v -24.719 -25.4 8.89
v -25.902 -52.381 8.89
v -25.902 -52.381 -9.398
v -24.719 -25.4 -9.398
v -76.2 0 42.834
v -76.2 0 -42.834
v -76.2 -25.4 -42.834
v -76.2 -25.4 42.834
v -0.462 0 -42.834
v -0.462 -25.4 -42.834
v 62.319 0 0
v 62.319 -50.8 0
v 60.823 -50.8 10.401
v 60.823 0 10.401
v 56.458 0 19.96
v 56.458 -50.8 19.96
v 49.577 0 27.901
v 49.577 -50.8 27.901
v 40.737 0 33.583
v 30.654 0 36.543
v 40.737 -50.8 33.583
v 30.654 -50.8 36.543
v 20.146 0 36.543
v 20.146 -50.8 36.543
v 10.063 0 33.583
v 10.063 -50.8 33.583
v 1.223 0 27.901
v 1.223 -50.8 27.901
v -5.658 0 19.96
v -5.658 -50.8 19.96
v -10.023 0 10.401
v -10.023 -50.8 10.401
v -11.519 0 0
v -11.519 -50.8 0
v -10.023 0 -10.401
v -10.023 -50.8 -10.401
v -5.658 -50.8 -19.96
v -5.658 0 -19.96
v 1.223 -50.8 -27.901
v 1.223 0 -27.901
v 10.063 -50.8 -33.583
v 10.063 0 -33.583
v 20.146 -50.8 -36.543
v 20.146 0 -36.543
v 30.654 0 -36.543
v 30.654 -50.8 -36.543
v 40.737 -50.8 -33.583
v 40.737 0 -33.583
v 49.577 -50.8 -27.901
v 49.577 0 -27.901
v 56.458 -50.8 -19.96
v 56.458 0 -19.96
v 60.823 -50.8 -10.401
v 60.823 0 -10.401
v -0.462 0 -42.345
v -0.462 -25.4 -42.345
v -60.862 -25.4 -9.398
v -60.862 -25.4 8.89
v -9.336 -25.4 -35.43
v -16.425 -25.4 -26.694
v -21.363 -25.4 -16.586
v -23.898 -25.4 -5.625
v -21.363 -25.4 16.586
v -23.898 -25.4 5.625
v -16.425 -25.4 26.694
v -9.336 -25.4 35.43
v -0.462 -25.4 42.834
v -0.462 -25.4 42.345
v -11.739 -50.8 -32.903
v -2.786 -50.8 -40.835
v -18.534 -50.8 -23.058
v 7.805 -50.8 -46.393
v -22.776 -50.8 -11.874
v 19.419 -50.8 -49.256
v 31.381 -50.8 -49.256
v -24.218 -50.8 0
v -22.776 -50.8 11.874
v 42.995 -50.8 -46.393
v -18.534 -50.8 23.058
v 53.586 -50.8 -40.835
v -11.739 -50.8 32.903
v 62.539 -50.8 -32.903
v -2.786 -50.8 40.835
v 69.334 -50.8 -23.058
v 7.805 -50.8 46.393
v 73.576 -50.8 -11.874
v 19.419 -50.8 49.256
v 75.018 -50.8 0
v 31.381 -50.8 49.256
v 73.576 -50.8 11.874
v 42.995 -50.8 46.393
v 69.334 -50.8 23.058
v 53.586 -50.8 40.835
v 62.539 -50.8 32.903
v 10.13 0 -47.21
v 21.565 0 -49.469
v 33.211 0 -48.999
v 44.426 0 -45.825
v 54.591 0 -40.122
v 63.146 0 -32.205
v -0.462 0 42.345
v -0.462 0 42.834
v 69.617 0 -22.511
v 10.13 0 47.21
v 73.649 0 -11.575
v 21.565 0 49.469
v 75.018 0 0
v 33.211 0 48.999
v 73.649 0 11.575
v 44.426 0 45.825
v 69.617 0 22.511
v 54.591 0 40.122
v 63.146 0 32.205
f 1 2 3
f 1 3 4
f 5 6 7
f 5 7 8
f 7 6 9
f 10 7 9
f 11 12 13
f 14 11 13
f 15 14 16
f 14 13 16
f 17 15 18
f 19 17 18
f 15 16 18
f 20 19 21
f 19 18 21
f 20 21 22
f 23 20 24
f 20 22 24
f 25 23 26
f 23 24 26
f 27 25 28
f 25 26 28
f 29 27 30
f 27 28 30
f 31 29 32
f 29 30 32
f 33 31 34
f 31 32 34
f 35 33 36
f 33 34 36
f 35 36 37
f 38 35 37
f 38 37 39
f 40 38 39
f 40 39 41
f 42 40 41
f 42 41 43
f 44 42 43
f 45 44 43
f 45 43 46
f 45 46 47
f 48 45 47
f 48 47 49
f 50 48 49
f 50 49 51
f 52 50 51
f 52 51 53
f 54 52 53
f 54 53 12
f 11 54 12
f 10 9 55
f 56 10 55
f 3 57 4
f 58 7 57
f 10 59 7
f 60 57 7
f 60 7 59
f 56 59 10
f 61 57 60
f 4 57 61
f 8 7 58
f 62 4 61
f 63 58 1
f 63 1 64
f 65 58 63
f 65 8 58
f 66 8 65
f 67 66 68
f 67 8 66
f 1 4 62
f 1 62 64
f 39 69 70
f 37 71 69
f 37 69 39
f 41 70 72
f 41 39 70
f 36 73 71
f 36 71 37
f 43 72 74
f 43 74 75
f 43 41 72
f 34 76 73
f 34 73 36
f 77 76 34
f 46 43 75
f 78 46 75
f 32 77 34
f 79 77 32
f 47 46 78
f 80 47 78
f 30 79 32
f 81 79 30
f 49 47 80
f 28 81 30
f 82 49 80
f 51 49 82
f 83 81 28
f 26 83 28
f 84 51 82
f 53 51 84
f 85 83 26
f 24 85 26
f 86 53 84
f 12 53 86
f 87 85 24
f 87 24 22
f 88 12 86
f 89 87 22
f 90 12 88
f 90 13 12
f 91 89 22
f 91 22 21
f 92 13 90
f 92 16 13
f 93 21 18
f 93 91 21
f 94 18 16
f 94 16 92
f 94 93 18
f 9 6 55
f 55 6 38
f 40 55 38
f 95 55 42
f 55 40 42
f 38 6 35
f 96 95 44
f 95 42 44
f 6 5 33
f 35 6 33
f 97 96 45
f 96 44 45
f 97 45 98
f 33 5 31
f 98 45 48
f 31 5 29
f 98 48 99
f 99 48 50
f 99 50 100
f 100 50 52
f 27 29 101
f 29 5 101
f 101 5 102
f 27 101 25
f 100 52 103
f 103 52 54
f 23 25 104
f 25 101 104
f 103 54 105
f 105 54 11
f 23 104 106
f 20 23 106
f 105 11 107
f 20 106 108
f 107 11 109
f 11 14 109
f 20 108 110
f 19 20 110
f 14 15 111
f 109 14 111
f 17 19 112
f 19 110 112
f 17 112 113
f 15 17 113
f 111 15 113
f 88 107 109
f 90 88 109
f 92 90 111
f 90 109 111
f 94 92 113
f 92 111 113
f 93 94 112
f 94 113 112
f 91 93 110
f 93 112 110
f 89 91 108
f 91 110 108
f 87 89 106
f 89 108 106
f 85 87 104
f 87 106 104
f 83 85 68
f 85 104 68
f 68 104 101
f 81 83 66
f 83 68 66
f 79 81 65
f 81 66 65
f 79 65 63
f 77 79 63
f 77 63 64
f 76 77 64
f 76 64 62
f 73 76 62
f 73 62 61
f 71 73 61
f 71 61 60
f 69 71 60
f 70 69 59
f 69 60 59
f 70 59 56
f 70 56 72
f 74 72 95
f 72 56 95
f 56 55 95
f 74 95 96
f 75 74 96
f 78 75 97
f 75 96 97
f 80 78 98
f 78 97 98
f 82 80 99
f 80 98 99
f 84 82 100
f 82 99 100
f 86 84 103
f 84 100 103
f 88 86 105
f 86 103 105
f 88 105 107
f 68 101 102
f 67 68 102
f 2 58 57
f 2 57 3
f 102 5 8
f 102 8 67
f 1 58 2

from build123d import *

# Parameters (mm, degrees)
F0_W          = 75.738184
F0_H          = 85.667274
F2_DEPTH      = 25.4
F1_R          = 49.61766
F3_DEPTH      = 50.8
F4_R          = 36.918928
F5_DEPTH      = 50.801
F7_DEPTH      = 8.89
F7_DEPTH_BACK = 9.398


with BuildPart() as f2:
    # F0 (on Front) → F2 (new body)
    with BuildSketch(Plane.XZ):
        with Locations((-38.330909, 0)):
            Rectangle(F0_W, F0_H)
    extrude(amount=F2_DEPTH)

    # F1 (on Front) → F3 (join)
    with BuildSketch(Plane.XZ):
        with Locations((25.399998, 0)):
            Circle(F1_R)
    extrude(amount=F3_DEPTH)

    # F4 (on face) → F5 (cut, through all)
    with BuildSketch(Plane.XZ.offset(50.8)):
        with Locations((25.399998, 0)):
            Circle(F4_R)
    extrude(amount=-F5_DEPTH, mode=Mode.SUBTRACT)

    # F6 (on Top) → F7 (join, two sides)
    with BuildSketch(Plane.XY) as f7_sk:
        Polygon((-61.508864, -24.901086), (-25.902238, -52.381378), (-24.69754, -24.901086), align=None)
    extrude(amount=F7_DEPTH)
    extrude(f7_sk.sketch, amount=-F7_DEPTH_BACK)


solid = f2.part
